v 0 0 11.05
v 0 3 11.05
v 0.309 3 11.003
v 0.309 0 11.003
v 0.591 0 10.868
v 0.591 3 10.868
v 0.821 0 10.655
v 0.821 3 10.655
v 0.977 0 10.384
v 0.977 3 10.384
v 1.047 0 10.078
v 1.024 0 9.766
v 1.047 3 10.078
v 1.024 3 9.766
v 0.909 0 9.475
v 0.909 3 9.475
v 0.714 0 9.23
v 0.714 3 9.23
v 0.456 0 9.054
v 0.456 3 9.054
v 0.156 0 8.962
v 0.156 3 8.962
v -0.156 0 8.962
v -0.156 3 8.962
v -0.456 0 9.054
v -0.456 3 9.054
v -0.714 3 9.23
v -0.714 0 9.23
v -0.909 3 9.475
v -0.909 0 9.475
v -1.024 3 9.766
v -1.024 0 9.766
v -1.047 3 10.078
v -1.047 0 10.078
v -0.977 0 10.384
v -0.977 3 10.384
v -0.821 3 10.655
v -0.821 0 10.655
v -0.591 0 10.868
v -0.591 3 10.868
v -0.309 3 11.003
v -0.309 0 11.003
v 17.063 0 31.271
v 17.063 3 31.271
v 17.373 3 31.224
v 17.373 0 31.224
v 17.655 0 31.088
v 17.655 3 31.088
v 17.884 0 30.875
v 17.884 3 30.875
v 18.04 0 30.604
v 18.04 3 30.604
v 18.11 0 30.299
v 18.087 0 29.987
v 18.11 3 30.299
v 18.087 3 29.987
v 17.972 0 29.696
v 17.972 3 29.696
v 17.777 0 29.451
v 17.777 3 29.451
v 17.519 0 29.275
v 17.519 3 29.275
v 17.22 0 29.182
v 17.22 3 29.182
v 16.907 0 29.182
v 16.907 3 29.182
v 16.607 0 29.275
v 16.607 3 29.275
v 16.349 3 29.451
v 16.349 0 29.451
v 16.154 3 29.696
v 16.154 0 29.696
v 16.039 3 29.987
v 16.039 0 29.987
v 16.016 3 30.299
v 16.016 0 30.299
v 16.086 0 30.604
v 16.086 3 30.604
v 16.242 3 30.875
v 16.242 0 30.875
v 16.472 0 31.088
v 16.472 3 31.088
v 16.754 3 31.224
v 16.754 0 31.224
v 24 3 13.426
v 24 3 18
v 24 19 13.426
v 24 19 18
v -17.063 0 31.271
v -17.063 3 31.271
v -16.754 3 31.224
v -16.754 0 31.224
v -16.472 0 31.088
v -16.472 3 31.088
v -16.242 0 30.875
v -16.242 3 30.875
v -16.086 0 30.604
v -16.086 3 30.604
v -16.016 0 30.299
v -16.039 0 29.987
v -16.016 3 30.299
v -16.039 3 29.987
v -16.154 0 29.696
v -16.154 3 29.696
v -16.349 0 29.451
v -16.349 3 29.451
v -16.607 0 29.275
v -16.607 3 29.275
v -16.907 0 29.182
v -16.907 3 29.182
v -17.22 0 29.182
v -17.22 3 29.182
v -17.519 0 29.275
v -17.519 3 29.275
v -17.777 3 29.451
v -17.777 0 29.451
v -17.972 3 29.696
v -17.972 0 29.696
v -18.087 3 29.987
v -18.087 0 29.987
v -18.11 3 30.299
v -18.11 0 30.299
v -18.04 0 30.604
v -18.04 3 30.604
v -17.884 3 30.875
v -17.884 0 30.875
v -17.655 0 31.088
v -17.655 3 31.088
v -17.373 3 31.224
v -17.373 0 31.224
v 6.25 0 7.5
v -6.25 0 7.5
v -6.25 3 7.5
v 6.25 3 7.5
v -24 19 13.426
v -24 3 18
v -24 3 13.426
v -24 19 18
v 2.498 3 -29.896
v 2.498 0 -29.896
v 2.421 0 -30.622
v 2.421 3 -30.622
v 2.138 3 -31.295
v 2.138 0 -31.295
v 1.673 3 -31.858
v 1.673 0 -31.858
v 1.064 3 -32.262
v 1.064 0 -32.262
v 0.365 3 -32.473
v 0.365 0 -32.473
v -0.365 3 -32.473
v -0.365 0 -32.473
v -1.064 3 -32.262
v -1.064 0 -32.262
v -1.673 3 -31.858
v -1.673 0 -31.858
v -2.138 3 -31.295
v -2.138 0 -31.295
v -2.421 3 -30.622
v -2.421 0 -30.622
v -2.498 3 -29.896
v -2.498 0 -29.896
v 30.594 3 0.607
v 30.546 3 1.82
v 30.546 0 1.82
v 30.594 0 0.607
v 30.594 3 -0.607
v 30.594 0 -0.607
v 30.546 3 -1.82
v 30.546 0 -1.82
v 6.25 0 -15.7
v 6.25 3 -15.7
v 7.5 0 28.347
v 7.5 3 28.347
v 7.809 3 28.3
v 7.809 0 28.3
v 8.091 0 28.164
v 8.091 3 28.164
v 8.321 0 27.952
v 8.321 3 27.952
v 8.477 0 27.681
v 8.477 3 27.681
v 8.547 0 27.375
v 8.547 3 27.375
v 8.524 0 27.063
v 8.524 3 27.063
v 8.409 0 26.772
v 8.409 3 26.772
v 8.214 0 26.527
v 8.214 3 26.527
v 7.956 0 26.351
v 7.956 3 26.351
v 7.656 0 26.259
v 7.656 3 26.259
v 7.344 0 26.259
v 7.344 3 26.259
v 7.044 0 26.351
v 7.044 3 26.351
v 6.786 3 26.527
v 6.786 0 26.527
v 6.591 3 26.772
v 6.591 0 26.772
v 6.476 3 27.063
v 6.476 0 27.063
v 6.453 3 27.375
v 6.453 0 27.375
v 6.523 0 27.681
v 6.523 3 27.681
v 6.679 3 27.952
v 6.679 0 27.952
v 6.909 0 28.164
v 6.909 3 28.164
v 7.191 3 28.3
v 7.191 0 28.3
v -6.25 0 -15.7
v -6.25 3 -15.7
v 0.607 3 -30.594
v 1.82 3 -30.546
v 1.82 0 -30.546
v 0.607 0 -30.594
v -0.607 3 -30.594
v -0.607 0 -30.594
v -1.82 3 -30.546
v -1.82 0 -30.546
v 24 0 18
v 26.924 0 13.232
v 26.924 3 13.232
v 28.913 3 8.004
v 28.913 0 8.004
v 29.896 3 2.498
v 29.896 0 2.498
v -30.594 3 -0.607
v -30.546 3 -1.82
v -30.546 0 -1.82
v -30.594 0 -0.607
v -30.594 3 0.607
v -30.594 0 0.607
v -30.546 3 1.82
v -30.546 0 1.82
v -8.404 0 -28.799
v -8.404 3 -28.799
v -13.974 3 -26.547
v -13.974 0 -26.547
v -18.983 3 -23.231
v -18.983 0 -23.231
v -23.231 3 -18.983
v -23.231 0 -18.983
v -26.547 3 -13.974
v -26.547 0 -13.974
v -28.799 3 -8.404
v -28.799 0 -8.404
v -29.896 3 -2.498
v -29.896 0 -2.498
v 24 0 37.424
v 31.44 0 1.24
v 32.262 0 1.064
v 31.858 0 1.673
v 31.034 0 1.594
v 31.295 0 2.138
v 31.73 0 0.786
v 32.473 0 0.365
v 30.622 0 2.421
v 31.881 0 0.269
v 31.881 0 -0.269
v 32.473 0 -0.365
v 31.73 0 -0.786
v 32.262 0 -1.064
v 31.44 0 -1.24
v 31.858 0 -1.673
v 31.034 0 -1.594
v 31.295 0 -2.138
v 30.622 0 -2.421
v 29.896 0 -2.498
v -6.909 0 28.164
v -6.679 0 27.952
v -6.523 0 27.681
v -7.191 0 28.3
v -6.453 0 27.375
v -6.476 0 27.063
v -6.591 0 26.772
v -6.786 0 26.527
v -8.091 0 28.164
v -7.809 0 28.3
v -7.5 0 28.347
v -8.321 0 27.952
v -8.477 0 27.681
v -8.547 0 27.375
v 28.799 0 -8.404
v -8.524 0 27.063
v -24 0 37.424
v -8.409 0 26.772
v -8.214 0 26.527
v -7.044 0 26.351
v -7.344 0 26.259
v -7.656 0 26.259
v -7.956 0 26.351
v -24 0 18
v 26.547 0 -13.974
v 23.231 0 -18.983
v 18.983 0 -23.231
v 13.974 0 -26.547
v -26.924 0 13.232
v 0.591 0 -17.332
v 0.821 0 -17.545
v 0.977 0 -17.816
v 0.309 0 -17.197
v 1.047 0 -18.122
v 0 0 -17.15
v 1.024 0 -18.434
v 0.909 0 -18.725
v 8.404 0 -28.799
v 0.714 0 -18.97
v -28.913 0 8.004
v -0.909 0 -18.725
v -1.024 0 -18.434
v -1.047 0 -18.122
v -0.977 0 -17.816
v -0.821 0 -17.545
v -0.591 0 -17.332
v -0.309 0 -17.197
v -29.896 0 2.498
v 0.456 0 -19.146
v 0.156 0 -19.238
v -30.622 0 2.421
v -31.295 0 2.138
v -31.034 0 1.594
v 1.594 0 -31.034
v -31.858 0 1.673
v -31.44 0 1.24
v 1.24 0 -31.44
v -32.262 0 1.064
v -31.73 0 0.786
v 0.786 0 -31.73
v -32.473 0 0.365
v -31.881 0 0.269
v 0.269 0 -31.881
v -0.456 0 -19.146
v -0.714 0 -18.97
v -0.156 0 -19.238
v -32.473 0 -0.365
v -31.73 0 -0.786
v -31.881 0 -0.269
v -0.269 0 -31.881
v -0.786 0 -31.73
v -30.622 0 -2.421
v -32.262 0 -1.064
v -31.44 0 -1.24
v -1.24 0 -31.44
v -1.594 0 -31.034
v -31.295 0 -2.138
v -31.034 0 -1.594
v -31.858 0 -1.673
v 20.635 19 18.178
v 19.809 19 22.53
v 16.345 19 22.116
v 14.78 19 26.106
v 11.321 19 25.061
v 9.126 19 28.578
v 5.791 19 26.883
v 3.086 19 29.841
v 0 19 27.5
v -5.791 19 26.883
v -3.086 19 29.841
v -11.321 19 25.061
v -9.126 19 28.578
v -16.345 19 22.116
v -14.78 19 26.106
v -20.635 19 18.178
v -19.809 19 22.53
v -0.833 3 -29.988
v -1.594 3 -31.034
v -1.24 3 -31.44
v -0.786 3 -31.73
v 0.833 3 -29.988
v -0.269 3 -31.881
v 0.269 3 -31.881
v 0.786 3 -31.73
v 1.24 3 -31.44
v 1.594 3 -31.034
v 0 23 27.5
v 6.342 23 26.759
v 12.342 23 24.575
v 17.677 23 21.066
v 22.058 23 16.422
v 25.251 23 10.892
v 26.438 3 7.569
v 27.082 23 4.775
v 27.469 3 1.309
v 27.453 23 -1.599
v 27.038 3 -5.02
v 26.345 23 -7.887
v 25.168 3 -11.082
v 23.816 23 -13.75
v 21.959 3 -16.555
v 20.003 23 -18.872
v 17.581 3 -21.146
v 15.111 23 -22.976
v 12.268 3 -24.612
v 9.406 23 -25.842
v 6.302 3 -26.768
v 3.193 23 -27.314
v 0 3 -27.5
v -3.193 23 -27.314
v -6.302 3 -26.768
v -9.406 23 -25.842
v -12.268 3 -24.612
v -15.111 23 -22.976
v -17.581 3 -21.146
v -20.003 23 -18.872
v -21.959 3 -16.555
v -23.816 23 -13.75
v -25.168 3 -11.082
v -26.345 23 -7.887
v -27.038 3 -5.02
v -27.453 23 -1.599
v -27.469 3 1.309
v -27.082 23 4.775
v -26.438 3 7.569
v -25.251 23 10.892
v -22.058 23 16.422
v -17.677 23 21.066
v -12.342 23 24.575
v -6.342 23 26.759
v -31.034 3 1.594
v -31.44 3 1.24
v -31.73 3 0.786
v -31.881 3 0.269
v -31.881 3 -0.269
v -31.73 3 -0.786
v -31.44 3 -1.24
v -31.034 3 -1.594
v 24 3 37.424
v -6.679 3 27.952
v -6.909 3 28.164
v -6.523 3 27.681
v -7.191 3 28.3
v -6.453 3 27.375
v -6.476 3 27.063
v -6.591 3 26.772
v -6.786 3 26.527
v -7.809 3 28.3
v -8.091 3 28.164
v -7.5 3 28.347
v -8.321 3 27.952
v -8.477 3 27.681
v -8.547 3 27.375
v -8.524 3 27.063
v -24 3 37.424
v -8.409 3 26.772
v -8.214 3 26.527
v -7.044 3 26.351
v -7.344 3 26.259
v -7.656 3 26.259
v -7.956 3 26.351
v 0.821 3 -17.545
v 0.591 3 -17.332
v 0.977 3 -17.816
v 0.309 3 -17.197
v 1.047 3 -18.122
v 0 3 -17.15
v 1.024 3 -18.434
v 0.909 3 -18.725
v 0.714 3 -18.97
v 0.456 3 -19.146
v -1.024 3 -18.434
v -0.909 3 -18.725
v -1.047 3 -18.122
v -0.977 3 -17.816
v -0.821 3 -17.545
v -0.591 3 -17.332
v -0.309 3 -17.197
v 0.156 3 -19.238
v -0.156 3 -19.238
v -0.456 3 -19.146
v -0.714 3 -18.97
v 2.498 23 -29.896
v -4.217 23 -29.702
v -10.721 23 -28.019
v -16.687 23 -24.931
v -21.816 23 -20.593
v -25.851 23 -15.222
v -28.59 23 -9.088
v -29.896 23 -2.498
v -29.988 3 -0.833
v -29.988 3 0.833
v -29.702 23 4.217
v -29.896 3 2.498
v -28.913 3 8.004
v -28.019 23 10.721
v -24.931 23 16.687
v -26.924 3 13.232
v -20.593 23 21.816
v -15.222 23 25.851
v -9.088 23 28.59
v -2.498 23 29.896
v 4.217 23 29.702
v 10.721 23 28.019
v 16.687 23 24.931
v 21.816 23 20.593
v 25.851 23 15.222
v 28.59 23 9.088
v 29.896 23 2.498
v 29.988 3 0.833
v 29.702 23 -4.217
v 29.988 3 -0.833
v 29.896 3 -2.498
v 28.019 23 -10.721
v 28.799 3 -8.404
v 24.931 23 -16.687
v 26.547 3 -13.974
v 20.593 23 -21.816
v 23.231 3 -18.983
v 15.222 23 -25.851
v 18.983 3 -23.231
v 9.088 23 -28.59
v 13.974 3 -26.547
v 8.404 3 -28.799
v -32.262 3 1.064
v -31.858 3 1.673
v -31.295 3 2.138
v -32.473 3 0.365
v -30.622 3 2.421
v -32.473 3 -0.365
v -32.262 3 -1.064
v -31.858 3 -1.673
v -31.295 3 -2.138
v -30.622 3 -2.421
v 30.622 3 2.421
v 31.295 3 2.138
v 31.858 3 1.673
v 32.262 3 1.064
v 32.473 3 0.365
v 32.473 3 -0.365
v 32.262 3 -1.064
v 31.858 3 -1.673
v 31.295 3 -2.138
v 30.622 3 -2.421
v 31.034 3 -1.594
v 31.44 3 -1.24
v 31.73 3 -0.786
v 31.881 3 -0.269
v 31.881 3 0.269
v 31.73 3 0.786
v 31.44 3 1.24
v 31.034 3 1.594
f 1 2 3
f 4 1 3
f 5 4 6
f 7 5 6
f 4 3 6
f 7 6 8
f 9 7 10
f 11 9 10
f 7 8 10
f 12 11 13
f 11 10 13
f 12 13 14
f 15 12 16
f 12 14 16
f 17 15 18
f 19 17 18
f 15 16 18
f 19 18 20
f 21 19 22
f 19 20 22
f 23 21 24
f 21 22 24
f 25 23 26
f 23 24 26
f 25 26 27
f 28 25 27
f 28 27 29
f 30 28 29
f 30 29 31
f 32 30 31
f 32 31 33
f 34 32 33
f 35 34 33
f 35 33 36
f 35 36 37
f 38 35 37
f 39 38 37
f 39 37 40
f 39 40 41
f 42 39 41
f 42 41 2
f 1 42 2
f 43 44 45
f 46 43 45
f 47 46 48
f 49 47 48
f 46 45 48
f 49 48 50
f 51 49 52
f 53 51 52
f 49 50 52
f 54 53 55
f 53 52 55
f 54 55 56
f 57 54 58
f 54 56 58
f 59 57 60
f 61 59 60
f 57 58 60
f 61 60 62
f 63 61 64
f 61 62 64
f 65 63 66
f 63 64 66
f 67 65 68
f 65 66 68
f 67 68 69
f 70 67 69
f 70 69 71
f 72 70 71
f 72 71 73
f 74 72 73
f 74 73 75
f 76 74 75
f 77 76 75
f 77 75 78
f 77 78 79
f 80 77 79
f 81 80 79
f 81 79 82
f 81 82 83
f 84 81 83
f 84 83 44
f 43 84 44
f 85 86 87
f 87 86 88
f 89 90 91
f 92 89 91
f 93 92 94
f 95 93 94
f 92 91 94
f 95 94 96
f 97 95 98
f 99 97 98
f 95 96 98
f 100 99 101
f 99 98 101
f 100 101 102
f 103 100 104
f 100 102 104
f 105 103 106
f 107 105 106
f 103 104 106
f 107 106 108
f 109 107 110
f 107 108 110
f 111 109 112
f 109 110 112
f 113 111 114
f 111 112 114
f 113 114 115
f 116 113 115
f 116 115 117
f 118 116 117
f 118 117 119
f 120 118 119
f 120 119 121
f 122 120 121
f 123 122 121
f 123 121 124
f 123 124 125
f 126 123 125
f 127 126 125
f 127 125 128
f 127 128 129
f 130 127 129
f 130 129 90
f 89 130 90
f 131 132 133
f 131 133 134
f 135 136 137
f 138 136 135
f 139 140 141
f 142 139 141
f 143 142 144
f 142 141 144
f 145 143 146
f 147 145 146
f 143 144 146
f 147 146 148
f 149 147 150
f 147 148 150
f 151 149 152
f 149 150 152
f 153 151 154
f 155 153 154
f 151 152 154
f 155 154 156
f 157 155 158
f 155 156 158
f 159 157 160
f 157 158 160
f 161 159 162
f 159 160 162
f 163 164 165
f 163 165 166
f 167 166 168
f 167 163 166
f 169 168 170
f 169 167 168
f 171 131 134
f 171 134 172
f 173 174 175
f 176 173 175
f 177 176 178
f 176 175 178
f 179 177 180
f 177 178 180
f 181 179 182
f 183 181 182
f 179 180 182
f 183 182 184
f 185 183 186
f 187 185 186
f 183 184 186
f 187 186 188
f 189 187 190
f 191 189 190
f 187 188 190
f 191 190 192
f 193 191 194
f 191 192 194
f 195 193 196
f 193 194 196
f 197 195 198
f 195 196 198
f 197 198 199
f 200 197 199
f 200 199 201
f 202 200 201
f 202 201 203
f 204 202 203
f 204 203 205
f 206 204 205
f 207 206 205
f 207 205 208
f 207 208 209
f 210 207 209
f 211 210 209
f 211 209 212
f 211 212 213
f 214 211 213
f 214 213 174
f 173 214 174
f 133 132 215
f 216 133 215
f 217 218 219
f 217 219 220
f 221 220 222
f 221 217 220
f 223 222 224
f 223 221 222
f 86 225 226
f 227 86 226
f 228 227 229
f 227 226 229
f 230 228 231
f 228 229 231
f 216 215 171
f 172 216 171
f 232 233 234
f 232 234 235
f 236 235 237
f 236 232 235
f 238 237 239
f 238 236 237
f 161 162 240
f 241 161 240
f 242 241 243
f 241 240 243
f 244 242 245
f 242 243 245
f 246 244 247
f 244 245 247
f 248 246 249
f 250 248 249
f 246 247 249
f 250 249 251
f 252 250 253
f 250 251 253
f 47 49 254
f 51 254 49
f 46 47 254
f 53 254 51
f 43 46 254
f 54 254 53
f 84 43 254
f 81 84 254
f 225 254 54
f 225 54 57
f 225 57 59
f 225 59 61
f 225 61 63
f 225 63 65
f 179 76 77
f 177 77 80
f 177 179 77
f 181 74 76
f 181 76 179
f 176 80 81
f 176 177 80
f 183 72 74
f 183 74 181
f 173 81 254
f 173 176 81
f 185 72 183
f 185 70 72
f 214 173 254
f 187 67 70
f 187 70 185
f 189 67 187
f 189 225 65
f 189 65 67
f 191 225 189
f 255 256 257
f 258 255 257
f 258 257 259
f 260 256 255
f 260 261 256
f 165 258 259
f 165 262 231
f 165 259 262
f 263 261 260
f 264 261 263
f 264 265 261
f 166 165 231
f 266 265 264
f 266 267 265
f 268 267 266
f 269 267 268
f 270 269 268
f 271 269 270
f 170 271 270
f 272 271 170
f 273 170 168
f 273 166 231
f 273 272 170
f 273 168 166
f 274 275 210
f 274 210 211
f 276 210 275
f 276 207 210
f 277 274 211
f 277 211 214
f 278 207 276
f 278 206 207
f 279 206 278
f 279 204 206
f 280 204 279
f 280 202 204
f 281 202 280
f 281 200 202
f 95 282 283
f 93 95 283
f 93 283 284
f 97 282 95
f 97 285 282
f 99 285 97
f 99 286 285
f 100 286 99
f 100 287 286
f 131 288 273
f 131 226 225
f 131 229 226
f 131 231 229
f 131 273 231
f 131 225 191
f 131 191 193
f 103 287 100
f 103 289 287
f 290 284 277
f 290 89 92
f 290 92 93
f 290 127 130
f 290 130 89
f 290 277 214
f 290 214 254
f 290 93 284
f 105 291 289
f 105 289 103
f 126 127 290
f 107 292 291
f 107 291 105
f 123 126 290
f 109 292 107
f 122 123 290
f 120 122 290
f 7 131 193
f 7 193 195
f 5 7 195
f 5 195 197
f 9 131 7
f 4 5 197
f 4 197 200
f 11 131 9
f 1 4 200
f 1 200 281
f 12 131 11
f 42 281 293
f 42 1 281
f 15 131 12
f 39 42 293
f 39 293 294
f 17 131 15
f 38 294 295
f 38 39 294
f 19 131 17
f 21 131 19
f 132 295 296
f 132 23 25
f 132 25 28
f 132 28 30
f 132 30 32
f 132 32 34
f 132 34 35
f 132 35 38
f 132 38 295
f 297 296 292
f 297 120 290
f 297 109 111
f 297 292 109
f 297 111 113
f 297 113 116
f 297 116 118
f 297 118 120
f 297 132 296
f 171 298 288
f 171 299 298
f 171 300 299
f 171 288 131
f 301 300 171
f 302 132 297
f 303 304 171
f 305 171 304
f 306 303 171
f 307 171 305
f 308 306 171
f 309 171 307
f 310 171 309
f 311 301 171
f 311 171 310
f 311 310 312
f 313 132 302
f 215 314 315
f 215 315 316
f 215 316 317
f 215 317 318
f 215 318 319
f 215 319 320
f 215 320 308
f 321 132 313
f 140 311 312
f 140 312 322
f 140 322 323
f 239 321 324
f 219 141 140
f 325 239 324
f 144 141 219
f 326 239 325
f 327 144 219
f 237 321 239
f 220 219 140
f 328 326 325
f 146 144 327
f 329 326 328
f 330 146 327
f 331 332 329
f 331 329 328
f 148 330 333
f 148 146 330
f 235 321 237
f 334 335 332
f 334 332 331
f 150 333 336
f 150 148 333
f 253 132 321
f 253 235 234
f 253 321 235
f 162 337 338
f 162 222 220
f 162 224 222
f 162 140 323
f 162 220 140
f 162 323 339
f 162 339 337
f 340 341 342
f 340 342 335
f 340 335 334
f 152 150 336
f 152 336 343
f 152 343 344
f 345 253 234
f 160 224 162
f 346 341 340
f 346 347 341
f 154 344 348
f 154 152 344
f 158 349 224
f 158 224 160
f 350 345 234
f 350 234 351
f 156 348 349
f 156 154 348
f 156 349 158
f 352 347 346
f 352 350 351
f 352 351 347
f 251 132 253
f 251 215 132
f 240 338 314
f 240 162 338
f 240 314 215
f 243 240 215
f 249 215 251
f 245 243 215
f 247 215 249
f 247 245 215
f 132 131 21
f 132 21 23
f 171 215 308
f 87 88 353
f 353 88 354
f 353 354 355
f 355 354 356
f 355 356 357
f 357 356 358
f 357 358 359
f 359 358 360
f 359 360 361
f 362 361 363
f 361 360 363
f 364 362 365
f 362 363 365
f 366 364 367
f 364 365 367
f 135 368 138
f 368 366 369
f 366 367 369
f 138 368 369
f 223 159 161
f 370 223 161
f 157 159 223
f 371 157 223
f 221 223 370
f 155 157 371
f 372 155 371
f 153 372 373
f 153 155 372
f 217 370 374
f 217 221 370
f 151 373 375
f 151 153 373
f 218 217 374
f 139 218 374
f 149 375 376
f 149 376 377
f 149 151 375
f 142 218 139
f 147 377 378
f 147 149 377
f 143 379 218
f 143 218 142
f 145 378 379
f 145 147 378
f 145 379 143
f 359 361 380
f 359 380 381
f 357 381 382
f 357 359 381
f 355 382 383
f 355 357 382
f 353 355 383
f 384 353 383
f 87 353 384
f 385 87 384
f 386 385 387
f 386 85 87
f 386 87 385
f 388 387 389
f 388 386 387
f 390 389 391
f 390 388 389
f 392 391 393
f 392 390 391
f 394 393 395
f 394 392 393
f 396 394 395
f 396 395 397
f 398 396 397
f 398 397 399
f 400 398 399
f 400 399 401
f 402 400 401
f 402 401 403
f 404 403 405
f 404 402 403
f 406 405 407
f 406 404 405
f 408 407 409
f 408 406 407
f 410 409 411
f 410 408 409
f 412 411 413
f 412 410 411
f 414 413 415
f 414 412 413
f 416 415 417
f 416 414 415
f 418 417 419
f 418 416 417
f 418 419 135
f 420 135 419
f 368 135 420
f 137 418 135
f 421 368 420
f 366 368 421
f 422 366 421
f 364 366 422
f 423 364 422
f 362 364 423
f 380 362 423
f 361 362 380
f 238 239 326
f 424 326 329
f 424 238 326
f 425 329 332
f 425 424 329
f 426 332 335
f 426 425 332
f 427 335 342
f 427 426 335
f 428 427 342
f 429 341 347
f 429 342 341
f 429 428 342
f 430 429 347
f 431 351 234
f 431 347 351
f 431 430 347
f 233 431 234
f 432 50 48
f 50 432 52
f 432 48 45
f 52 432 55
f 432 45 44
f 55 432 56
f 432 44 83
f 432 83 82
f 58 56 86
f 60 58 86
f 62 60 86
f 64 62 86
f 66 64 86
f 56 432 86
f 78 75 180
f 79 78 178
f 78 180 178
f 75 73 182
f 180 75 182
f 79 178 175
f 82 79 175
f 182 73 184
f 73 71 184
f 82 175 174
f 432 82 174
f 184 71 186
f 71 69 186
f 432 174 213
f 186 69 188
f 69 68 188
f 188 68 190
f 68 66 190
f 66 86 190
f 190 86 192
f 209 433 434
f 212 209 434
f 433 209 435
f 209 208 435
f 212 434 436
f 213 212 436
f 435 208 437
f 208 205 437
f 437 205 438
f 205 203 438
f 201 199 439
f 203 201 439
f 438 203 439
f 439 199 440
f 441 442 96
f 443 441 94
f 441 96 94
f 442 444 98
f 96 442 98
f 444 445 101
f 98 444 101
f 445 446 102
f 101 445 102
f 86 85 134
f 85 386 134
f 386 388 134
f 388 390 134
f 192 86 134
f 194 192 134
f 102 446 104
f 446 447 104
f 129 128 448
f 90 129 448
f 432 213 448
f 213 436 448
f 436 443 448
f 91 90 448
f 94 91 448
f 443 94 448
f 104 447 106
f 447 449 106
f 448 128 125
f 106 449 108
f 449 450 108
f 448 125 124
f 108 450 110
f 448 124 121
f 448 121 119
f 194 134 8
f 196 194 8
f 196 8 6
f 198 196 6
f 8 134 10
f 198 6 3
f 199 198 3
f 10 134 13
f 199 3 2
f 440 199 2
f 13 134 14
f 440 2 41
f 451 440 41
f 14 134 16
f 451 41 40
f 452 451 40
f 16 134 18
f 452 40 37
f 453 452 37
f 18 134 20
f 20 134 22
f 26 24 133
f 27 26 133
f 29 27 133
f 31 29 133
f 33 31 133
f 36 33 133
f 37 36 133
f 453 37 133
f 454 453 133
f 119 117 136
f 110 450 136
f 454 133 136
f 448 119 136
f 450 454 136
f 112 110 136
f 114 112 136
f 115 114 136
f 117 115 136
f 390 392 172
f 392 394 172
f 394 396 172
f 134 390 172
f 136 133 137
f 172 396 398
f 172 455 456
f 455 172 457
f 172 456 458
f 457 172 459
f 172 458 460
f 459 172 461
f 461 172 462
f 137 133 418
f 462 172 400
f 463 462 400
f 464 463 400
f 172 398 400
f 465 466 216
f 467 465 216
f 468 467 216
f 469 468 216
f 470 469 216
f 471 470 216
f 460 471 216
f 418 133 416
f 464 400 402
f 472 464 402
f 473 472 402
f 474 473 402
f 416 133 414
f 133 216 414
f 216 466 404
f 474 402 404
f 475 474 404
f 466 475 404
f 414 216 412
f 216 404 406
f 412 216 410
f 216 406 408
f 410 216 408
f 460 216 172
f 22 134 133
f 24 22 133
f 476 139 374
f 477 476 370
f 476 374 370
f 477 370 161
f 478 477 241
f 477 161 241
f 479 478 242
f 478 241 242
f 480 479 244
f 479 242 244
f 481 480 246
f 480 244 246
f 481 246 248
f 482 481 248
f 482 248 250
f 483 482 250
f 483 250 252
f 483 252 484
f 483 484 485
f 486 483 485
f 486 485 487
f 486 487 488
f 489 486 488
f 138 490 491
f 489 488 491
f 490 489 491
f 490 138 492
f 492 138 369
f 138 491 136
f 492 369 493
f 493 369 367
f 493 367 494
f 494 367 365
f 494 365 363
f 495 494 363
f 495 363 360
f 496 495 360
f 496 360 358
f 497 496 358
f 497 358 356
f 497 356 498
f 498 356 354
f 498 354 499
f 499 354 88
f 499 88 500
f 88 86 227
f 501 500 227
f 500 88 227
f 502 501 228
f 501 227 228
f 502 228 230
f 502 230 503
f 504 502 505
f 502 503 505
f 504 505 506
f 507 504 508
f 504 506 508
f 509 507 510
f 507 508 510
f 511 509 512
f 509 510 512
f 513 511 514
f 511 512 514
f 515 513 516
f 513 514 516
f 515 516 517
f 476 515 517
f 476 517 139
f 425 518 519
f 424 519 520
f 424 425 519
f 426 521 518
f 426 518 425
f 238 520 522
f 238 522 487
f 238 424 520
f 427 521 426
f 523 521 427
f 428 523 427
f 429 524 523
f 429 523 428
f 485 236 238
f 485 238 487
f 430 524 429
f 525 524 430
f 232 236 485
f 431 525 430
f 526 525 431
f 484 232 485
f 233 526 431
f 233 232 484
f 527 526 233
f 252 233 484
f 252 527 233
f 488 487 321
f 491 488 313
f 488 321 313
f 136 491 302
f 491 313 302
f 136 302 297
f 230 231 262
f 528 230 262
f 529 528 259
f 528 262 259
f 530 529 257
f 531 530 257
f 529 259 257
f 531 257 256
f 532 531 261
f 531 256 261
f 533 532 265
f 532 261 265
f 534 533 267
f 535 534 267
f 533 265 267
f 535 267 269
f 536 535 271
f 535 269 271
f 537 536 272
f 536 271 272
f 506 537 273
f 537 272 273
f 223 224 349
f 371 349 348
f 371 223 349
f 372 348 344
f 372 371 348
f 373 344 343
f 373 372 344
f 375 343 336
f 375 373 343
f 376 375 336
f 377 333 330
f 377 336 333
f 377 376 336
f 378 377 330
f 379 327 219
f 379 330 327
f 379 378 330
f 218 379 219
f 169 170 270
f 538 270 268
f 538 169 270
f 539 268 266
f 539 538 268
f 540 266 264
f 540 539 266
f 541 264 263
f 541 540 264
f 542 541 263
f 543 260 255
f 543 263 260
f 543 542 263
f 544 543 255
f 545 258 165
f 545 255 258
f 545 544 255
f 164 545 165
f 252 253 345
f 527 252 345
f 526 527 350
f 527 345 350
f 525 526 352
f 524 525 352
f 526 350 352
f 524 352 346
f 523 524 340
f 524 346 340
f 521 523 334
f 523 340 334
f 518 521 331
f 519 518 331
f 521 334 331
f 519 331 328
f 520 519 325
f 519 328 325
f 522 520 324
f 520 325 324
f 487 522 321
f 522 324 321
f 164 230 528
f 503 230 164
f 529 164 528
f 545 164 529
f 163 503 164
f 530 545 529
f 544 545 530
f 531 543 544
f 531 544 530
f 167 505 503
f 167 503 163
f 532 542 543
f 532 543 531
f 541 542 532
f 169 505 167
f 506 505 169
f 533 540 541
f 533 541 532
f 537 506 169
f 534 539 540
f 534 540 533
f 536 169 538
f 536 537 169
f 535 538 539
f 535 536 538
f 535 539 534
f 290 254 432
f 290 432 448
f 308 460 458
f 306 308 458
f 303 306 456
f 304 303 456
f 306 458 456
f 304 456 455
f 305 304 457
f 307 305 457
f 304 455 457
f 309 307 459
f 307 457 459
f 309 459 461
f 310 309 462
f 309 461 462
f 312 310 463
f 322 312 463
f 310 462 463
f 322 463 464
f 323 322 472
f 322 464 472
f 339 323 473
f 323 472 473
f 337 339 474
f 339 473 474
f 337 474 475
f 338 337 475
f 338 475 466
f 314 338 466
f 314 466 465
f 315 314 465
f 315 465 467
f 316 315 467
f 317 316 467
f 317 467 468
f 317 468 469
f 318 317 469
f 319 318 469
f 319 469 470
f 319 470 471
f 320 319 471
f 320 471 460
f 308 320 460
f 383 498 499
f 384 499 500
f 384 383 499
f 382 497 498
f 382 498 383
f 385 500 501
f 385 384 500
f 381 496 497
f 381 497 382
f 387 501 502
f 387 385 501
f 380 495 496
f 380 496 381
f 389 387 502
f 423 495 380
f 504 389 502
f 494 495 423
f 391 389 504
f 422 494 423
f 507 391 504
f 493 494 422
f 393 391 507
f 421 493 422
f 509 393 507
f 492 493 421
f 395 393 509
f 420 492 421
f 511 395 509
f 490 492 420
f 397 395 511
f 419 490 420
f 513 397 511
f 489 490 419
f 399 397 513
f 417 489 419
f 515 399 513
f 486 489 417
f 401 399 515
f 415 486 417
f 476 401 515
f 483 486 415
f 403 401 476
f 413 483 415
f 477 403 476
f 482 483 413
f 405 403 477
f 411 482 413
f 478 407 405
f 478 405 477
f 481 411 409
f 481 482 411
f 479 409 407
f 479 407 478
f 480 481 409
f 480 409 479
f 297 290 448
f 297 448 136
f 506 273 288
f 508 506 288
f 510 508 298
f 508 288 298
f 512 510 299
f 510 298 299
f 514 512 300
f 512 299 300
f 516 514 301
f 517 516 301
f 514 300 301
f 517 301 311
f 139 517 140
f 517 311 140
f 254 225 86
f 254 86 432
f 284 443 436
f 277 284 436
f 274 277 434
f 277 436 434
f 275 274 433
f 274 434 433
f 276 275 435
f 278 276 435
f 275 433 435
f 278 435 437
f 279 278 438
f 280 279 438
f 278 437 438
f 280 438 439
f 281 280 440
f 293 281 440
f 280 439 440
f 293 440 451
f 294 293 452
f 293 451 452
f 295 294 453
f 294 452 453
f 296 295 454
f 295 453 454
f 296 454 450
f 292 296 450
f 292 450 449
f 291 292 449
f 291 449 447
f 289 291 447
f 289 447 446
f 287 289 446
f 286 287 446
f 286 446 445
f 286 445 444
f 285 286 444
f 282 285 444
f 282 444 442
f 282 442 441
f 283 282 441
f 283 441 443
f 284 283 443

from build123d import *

# Parameters (mm, degrees)
SKETCH1_W           = 12.5
SKETCH1_H           = 23.2
BOSS_EXTRUDE1_DEPTH = 3
SKETCH4_R           = 30
SKETCH4_R_2         = 27.5
BOSS_EXTRUDE3_DEPTH = 20
SKETCH5_R           = 1.05
CUT_EXTRUDE2_DEPTH  = 51.124844139
BOSS_EXTRUDE4_DEPTH = 3
CUT_EXTRUDE11_START = -8.575715
SKETCH9_W           = 48
SKETCH9_H           = 16
CUT_EXTRUDE11_DEPTH = 16.574279
CUT_EXTRUDE12_DEPTH = 52.393398578
BOSS_EXTRUDE8_START = -3
BOSS_EXTRUDE8_DEPTH = 3
SKETCH10_R          = 1.05
CUT_EXTRUDE13_DEPTH = 54.449294936


with BuildPart() as part:
    # Sketch1 → Boss-Extrude1 (new body)
    with BuildSketch(Plane(origin=(0, 0, 0), x_dir=(1, 0, 0), z_dir=(0, 1, 0))):
        with BuildLine():
            ThreePointArc((-29.895833333, -2.497828918), (0, -30), (29.895833333, -2.497828918))
            ThreePointArc((29.895833333, -2.497828918), (32.5, 0), (29.895833333, 2.497828918))
            ThreePointArc((29.895833333, 2.497828918), (21.213203436, 21.213203436), (2.497828918, 29.895833333))
            ThreePointArc((2.497828918, 29.895833333), (0, 32.5), (-2.497828918, 29.895833333))
            ThreePointArc((-2.497828918, 29.895833333), (-21.213203436, 21.213203436), (-29.895833333, 2.497828918))
            ThreePointArc((-29.895833333, 2.497828918), (-32.5, 0), (-29.895833333, -2.497828918))
        make_face()
        with Locations((0, 4.1)):
            Rectangle(SKETCH1_W, SKETCH1_H, mode=Mode.SUBTRACT)
    extrude(amount=BOSS_EXTRUDE1_DEPTH)

    # Sketch4 → Boss-Extrude3 (add)
    with BuildSketch(Plane(origin=(0, 3, 0), x_dir=(1, 0, 0), z_dir=(0, 1, 0))):
        with Locations(Location((0, 0, 0), (0, 0, 85.223969073))):
            Circle(SKETCH4_R)
        with Locations(Location((0, 0, 0), (0, 0, 270))):
            Circle(SKETCH4_R_2, mode=Mode.SUBTRACT)
    extrude(amount=BOSS_EXTRUDE3_DEPTH)

    # Sketch5 → Cut-Extrude2 (cut, through all)
    with BuildSketch(Plane(origin=(0, 3, 0), x_dir=(1, 0, 0), z_dir=(0, 1, 0))):
        with Locations(Location((0, 18.2, 0), (0, 0, 270))):
            Circle(SKETCH5_R)
        with Locations(Location((0, -10, 0), (0, 0, 270))):
            Circle(SKETCH5_R)
    extrude(amount=-CUT_EXTRUDE2_DEPTH, mode=Mode.SUBTRACT)

    # Sketch6 → Boss-Extrude4 (add)
    with BuildSketch(Plane(origin=(0, 0, 0), x_dir=(1, 0, 0), z_dir=(0, 1, 0))):
        with BuildLine():
            Line((-21, -21.424285286), (-21, -34.424285286))
            Line((-21, -34.424285286), (21, -34.424285286))
            Line((21, -34.424285286), (21, -21.424285286))
            ThreePointArc((21, -21.424285286), (0, -30), (-21, -21.424285286))
        make_face()
    extrude(amount=BOSS_EXTRUDE4_DEPTH)

    # Sketch9 → Cut-Extrude11 (cut)
    with BuildSketch(Plane(origin=(0, 0, 21.424285286), x_dir=(-1, 0, 0), z_dir=(0, 0, -1)).offset(CUT_EXTRUDE11_START)):
        with Locations((0, 11)):
            Rectangle(SKETCH9_W, SKETCH9_H)
    extrude(amount=CUT_EXTRUDE11_DEPTH, mode=Mode.SUBTRACT)

    # Sketch12 → Cut-Extrude12 (cut, through all)
    with BuildSketch(Plane(origin=(0, 3, 0), x_dir=(1, 0, 0), z_dir=(0, 1, 0))):
        with BuildLine():
            ThreePointArc((1.819908232, 30.545833333), (0, 30.6), (-1.819908232, 30.545833333))
            ThreePointArc((-1.819908232, 30.545833333), (0, 31.9), (1.819908232, 30.545833333))
        make_face()
        with BuildLine():
            ThreePointArc((30.545833333, -1.819908232), (30.6, 0), (30.545833333, 1.819908232))
            ThreePointArc((30.545833333, 1.819908232), (31.9, 0), (30.545833333, -1.819908232))
        make_face()
        with BuildLine():
            ThreePointArc((-30.545833333, 1.819908232), (-30.6, 0), (-30.545833333, -1.819908232))
            ThreePointArc((-30.545833333, -1.819908232), (-31.9, 0), (-30.545833333, 1.819908232))
        make_face()
    extrude(amount=-CUT_EXTRUDE12_DEPTH, mode=Mode.SUBTRACT)

    # Sketch13 → Boss-Extrude8 (add)
    with BuildSketch(Plane(origin=(0, 3, 0), x_dir=(1, 0, 0), z_dir=(0, 1, 0)).offset(BOSS_EXTRUDE8_START)):
        with BuildLine():
            Line((21, -34.424285286), (21, -21.424285286))
            ThreePointArc((21, -21.424285286), (22.565048913, -19.769131685), (24, -18))
            Line((24, -18), (24, -37.424285286))
            Line((24, -37.424285286), (-24, -37.424285286))
            Line((-24, -37.424285286), (-24, -18))
            ThreePointArc((-24, -18), (-22.565048913, -19.769131685), (-21, -21.424285286))
            Line((-21, -21.424285286), (-21, -34.424285286))
            Line((-21, -34.424285286), (21, -34.424285286))
        make_face()
    extrude(amount=BOSS_EXTRUDE8_DEPTH)

    # Sketch10 → Cut-Extrude13 (cut, through all)
    with BuildSketch(Plane(origin=(0, 3, 0), x_dir=(1, 0, 0), z_dir=(0, 1, 0))):
        with Locations(Location((-7.5, -27.296921086, 0), (0, 0, 270))):
            Circle(SKETCH10_R)
        with Locations(Location((-17.06304756, -30.220638133, 0), (0, 0, 270))):
            Circle(SKETCH10_R)
        with Locations(Location((7.5, -27.296921086, 0), (0, 0, 270))):
            Circle(SKETCH10_R)
        with Locations(Location((17.06304756, -30.220638133, 0), (0, 0, 270))):
            Circle(SKETCH10_R)
    extrude(amount=-CUT_EXTRUDE13_DEPTH, mode=Mode.SUBTRACT)


solid = part.part
